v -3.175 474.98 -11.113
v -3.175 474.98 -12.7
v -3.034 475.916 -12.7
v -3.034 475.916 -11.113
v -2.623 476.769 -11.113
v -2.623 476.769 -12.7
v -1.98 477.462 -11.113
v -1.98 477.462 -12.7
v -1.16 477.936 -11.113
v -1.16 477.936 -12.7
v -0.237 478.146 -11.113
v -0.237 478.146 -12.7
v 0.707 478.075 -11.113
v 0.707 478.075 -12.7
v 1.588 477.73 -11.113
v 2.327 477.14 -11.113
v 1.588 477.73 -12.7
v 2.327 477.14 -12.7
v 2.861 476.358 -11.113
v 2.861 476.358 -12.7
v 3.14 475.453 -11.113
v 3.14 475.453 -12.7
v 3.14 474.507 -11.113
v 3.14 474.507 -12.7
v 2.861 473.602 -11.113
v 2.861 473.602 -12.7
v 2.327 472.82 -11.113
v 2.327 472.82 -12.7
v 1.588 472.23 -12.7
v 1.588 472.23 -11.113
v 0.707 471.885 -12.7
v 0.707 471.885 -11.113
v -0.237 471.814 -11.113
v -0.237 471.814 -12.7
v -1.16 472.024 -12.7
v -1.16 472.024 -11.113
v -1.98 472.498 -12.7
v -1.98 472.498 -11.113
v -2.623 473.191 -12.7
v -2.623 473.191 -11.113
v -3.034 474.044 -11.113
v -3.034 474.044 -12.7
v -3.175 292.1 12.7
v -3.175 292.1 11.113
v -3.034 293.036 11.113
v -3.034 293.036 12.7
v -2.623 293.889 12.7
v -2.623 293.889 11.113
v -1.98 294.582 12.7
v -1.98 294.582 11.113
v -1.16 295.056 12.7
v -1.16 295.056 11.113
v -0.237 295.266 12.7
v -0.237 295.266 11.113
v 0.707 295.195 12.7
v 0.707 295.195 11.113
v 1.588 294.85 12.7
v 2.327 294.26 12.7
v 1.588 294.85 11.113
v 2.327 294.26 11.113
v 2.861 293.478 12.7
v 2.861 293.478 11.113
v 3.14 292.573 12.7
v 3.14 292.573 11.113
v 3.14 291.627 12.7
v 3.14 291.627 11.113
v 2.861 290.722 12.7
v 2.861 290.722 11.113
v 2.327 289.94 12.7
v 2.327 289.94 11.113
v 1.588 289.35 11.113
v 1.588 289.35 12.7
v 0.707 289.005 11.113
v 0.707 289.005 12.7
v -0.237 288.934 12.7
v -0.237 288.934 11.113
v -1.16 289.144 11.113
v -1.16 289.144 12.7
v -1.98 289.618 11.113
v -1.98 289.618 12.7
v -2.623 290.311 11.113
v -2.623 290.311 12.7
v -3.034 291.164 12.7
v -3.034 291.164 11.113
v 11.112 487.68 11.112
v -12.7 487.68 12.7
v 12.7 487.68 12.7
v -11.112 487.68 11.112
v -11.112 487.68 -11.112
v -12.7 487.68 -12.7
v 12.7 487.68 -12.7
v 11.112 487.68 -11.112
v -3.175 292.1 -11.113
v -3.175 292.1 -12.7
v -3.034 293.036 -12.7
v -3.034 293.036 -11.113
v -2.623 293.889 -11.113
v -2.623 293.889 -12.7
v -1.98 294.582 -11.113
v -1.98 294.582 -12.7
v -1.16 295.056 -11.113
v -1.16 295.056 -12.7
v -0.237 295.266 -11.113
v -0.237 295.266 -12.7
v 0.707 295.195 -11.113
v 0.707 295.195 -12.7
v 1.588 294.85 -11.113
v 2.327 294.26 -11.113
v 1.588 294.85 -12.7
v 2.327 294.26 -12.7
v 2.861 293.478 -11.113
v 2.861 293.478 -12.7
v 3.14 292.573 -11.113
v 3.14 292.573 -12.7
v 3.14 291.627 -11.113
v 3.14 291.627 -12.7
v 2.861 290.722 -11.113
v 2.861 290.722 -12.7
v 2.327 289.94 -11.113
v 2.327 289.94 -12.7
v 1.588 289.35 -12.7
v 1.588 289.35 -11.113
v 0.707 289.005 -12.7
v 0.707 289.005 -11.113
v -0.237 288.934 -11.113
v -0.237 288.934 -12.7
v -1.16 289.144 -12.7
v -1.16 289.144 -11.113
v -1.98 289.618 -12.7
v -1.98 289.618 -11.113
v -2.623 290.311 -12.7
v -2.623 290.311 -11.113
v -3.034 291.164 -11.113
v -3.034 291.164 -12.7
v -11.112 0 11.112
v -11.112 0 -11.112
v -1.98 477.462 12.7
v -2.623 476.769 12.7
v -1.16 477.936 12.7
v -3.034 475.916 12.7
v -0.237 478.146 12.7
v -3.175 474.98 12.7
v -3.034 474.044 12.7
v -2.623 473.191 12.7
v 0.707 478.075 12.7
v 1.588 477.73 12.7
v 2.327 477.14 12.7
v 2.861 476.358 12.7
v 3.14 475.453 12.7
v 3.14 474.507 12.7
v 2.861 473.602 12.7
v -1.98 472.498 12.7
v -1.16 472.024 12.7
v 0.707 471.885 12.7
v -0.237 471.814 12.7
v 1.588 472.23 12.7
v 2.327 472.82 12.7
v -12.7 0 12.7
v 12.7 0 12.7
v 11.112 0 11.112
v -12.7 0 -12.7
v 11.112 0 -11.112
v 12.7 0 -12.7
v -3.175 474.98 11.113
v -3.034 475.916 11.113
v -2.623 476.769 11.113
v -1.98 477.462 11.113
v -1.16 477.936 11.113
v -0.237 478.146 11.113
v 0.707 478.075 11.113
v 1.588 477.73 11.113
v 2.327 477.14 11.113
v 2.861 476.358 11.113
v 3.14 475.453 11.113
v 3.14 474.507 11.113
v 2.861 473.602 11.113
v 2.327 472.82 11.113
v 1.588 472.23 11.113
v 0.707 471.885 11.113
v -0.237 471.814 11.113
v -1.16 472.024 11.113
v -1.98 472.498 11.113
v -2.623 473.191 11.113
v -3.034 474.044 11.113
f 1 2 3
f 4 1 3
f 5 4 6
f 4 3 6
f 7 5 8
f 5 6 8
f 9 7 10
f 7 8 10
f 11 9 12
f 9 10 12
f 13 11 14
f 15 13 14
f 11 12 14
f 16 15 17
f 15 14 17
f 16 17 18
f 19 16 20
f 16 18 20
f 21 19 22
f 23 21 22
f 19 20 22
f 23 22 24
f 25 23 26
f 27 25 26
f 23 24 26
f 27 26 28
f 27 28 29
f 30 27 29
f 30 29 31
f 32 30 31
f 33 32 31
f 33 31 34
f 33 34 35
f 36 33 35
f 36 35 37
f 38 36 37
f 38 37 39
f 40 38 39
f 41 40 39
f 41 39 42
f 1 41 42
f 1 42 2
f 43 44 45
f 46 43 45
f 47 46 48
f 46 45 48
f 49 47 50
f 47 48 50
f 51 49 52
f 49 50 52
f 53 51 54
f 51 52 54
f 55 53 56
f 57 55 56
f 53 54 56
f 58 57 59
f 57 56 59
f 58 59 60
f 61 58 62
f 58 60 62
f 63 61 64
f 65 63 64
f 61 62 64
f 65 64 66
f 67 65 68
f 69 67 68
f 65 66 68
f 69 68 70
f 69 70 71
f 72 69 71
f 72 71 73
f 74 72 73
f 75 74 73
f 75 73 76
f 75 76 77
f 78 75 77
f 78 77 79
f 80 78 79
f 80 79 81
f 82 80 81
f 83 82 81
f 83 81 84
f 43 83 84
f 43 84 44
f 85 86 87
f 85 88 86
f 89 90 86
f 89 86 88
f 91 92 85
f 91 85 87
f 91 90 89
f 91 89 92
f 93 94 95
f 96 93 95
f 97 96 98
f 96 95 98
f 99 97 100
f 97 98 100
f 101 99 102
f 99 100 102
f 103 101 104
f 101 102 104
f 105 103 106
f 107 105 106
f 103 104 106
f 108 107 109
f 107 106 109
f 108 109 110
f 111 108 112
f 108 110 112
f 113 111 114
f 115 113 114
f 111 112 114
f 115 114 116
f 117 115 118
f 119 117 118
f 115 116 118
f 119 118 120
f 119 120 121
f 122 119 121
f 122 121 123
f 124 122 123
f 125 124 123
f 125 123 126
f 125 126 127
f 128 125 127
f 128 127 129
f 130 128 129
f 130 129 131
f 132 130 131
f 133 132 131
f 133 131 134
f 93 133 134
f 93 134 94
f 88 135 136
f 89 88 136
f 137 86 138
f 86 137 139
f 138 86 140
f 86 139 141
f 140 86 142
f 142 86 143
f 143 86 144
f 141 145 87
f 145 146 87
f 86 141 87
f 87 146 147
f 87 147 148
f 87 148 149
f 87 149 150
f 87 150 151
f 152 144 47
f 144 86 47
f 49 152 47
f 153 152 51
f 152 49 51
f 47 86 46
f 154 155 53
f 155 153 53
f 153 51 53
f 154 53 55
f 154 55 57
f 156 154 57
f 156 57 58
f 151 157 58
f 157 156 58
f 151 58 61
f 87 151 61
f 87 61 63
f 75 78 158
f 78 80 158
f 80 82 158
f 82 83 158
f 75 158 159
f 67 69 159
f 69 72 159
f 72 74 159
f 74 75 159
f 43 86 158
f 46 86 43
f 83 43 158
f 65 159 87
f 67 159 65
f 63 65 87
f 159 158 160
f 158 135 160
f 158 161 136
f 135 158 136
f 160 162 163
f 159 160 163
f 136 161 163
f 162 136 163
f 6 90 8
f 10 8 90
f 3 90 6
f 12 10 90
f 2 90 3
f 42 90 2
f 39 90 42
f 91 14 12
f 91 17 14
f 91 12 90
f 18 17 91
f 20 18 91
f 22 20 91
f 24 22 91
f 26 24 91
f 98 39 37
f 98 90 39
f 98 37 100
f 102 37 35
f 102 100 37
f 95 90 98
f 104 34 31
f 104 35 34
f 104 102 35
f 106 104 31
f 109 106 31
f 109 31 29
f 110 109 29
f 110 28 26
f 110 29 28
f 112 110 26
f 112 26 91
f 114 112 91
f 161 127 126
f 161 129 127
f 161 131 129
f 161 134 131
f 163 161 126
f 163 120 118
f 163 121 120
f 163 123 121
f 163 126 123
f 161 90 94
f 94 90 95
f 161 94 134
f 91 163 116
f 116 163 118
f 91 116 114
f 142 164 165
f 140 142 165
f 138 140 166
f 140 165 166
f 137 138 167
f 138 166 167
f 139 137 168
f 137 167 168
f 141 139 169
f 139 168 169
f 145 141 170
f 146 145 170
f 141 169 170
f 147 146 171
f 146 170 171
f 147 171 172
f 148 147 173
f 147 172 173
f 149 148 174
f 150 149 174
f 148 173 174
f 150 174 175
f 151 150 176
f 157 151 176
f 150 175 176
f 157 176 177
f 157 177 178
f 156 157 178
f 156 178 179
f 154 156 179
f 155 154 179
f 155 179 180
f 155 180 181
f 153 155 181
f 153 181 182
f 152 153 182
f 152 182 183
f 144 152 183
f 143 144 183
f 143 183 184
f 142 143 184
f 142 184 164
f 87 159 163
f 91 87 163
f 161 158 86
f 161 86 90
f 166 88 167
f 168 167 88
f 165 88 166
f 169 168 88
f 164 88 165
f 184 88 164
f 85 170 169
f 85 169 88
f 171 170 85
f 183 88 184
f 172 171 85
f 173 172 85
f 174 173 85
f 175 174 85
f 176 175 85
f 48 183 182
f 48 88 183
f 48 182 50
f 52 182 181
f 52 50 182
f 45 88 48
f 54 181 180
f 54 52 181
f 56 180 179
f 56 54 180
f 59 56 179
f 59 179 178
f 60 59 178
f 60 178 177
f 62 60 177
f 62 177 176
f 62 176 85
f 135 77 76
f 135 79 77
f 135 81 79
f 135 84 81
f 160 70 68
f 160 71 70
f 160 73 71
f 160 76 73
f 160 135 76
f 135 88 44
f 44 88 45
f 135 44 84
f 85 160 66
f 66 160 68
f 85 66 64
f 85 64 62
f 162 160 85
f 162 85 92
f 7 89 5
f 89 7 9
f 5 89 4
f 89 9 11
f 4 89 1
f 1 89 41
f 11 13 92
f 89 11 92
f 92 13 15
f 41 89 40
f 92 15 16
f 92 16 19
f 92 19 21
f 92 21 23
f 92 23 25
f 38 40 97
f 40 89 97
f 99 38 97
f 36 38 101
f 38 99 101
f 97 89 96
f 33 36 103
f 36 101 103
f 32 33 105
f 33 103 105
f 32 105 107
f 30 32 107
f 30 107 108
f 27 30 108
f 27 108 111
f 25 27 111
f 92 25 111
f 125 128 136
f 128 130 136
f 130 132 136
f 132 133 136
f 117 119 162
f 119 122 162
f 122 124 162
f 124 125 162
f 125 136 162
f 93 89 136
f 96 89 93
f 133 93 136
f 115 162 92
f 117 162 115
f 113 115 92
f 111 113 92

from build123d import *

# Parameters (mm, degrees)
SKETCH1_W                   = 25.4
SKETCH1_H                   = 25.4
SKETCH1_W_2                 = 22.225
SKETCH1_H_2                 = 22.225
BOSS_EXTRUDE1_DEPTH         = 487.68
F_1_4_0_25_DIAMETER_HOLE1_D = 6.35


with BuildPart() as part:
    # Sketch1 → Boss-Extrude1 (new body)
    with BuildSketch(Plane(origin=(0, 0, 0), x_dir=(1, 0, 0), z_dir=(0, 1, 0))):
        Rectangle(SKETCH1_W, SKETCH1_H)
        Rectangle(SKETCH1_W_2, SKETCH1_H_2, mode=Mode.SUBTRACT)
    extrude(amount=BOSS_EXTRUDE1_DEPTH)

    # 1/4 (0.25) Diameter Hole1 (through all)
    with Locations(Plane.XY.offset(12.7)):
        with Locations((0, 474.98), (0, 292.1)):
            Hole(F_1_4_0_25_DIAMETER_HOLE1_D / 2)


solid = part.part
